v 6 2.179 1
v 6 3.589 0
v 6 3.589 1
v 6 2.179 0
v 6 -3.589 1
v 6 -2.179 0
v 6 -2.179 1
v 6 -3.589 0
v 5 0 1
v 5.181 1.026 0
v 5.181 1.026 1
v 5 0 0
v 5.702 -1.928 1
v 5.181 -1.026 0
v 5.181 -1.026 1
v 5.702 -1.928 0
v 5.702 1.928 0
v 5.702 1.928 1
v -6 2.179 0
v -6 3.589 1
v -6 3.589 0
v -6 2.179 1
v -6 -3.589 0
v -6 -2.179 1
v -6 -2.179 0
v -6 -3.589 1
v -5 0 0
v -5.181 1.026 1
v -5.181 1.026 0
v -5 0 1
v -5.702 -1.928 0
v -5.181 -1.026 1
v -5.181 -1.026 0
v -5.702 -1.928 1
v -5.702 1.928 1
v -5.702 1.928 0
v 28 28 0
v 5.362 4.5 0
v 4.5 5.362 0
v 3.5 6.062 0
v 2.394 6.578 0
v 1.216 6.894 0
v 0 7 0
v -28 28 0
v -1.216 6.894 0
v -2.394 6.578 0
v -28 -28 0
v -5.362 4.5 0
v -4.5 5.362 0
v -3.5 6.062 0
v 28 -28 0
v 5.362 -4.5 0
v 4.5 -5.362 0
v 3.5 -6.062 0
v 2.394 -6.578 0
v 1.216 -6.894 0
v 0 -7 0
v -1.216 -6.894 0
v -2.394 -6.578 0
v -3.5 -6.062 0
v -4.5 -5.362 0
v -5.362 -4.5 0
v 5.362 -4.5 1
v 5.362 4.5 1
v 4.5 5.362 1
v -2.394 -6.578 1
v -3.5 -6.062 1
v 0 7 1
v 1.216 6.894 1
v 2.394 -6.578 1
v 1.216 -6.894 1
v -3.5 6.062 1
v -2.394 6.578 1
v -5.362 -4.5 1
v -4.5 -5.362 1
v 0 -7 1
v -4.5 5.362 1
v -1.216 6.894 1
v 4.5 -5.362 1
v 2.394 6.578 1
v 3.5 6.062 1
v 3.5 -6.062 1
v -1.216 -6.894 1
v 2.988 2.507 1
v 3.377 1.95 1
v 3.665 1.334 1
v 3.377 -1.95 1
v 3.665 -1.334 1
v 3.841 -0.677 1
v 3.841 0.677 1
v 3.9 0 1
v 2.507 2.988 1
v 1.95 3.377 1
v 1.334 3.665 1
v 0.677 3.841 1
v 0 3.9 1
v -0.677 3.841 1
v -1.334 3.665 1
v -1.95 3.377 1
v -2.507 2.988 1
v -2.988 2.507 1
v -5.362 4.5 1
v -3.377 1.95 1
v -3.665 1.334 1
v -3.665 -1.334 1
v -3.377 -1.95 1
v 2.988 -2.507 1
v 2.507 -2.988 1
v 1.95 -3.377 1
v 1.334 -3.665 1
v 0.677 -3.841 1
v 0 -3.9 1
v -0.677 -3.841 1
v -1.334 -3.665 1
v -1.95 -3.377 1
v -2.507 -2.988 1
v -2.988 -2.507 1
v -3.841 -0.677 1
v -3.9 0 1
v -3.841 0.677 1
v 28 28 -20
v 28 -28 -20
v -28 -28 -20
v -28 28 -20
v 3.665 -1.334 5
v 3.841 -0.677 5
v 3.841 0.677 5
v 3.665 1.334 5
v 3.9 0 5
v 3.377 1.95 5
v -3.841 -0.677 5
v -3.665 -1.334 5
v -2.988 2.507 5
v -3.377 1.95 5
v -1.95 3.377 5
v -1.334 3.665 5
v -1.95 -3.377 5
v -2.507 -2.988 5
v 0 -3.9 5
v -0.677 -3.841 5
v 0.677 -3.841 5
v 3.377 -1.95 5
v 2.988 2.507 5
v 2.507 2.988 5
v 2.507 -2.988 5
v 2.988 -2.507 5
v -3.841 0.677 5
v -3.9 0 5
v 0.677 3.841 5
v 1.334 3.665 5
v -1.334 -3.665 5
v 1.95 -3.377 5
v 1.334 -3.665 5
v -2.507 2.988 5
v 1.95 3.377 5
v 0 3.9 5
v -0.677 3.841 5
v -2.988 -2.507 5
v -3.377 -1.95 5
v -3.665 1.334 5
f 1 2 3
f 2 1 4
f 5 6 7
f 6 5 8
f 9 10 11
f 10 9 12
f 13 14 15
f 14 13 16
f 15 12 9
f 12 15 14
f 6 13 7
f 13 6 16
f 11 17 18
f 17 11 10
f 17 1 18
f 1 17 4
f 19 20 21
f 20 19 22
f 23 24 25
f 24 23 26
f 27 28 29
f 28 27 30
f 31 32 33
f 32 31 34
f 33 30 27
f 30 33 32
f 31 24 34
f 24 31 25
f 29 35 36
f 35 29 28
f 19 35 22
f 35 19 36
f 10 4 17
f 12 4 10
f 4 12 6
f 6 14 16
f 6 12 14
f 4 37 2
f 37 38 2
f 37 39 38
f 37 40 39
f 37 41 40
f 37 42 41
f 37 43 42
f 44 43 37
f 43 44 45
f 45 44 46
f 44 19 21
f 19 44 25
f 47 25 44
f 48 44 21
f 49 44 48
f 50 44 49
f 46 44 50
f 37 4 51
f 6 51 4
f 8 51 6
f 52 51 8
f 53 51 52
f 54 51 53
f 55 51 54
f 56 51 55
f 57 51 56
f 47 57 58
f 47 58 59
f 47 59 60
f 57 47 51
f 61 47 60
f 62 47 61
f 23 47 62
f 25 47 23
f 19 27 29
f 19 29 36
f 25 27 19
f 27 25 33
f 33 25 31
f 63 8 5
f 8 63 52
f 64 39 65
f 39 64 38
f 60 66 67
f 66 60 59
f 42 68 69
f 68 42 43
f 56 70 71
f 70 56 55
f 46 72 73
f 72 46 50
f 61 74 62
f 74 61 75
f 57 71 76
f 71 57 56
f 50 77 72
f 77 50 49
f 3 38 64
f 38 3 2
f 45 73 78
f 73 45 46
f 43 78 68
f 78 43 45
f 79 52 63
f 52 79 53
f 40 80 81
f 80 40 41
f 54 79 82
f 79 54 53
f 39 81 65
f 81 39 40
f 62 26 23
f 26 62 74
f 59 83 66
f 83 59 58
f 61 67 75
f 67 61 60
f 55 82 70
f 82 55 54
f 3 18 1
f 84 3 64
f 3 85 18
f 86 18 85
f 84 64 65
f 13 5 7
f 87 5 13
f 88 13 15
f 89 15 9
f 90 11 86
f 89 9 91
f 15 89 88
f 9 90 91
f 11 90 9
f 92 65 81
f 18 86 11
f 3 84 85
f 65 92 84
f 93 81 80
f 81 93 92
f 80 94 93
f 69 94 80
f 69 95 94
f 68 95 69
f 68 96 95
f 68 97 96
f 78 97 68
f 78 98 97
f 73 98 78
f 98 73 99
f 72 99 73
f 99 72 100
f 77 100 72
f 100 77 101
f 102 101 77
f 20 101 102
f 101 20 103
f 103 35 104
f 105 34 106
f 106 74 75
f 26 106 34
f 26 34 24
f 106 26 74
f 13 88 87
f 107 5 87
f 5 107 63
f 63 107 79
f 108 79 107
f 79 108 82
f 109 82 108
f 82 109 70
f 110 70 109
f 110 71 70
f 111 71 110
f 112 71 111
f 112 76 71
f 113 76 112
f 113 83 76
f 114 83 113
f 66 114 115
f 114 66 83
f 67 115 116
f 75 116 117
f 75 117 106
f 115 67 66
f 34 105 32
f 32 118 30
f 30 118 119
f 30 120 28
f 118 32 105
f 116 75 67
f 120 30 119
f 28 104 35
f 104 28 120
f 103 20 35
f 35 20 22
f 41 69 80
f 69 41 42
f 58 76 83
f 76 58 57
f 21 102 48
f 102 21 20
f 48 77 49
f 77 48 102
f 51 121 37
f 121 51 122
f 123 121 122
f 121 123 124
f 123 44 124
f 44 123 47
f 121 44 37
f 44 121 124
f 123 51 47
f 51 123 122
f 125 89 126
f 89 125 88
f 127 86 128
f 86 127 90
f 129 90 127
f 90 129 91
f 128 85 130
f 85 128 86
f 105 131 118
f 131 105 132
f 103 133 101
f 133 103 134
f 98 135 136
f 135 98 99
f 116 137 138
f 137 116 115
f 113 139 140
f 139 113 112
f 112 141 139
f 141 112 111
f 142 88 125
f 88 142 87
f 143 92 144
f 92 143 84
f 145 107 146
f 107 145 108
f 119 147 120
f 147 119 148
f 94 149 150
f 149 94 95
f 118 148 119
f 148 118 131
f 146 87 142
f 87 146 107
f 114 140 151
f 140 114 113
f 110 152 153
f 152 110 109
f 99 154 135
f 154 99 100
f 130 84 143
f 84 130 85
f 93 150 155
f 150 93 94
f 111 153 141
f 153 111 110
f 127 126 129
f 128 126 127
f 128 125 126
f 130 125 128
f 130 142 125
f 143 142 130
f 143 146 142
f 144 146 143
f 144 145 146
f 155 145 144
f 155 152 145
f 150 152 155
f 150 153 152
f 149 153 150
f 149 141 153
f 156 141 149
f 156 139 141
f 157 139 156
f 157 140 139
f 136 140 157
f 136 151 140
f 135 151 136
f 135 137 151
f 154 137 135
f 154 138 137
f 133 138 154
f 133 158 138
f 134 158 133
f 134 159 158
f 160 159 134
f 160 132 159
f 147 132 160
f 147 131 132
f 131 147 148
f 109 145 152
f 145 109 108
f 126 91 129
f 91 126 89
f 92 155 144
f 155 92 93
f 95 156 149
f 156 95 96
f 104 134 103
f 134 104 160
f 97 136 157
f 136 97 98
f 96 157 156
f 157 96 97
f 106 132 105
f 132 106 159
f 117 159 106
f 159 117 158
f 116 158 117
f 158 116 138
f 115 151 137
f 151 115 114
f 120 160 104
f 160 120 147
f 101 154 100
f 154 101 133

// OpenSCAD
module clock_movement() {
    
    // box-shaped main body
    width = 56;
    depth = 56;
    height = 20;
    
    // alignment pattern
    alignment_dm = 14; // diameter of alignment pattern
    alignment_h = 1;    // height of alignment pattern
    alignment_flat = 1; // recess of falttening
    alignment_notch_dm = 6; // diameter of alignment notches
    alignment_notch_fl = 2; // recess of notch flattening
    
    // main body
    color("Gray")
    // method 1 as of in the book
    translate( [-width / 2, -depth / 2 , -height ] )
    cube( [width, depth, height] ); 
    // method 2
//    translate( [0, 0, -height/2] )
//   # cube( [width, depth, height], center = true ); 

    // screw terminal (measured from main body)
    screw_terminal_dm = 7.8;    // screw terminal diameter
    screw_terminal_h = 5;   // screw terminal height
    
    // alignment pattern
     difference() {
        
        color("DarkBlue")
        cylinder( d = alignment_dm, h = alignment_h, $fn = 36);
        
        color("Gray")
        for ( i = [0:1] )
        mirror( [i, 0, 0] )
        union() {
            translate([ alignment_dm / 2 - alignment_flat, -(alignment_dm + 2) / 2, -1 ])
            cube([alignment_flat + 1, alignment_dm + 2, alignment_h + 2 ]);
            
            translate([ alignment_dm / 2 - alignment_notch_fl + alignment_notch_dm / 2, 0, -1 ])
            cylinder( d = alignment_notch_dm, h = alignment_h +2, $fn = 18);
        }
    }
    
    // screw terminal
    color("Gold")
    cylinder( d = screw_terminal_dm, h = screw_terminal_h, $fn = 36);
    
    }
    
clock_movement();
